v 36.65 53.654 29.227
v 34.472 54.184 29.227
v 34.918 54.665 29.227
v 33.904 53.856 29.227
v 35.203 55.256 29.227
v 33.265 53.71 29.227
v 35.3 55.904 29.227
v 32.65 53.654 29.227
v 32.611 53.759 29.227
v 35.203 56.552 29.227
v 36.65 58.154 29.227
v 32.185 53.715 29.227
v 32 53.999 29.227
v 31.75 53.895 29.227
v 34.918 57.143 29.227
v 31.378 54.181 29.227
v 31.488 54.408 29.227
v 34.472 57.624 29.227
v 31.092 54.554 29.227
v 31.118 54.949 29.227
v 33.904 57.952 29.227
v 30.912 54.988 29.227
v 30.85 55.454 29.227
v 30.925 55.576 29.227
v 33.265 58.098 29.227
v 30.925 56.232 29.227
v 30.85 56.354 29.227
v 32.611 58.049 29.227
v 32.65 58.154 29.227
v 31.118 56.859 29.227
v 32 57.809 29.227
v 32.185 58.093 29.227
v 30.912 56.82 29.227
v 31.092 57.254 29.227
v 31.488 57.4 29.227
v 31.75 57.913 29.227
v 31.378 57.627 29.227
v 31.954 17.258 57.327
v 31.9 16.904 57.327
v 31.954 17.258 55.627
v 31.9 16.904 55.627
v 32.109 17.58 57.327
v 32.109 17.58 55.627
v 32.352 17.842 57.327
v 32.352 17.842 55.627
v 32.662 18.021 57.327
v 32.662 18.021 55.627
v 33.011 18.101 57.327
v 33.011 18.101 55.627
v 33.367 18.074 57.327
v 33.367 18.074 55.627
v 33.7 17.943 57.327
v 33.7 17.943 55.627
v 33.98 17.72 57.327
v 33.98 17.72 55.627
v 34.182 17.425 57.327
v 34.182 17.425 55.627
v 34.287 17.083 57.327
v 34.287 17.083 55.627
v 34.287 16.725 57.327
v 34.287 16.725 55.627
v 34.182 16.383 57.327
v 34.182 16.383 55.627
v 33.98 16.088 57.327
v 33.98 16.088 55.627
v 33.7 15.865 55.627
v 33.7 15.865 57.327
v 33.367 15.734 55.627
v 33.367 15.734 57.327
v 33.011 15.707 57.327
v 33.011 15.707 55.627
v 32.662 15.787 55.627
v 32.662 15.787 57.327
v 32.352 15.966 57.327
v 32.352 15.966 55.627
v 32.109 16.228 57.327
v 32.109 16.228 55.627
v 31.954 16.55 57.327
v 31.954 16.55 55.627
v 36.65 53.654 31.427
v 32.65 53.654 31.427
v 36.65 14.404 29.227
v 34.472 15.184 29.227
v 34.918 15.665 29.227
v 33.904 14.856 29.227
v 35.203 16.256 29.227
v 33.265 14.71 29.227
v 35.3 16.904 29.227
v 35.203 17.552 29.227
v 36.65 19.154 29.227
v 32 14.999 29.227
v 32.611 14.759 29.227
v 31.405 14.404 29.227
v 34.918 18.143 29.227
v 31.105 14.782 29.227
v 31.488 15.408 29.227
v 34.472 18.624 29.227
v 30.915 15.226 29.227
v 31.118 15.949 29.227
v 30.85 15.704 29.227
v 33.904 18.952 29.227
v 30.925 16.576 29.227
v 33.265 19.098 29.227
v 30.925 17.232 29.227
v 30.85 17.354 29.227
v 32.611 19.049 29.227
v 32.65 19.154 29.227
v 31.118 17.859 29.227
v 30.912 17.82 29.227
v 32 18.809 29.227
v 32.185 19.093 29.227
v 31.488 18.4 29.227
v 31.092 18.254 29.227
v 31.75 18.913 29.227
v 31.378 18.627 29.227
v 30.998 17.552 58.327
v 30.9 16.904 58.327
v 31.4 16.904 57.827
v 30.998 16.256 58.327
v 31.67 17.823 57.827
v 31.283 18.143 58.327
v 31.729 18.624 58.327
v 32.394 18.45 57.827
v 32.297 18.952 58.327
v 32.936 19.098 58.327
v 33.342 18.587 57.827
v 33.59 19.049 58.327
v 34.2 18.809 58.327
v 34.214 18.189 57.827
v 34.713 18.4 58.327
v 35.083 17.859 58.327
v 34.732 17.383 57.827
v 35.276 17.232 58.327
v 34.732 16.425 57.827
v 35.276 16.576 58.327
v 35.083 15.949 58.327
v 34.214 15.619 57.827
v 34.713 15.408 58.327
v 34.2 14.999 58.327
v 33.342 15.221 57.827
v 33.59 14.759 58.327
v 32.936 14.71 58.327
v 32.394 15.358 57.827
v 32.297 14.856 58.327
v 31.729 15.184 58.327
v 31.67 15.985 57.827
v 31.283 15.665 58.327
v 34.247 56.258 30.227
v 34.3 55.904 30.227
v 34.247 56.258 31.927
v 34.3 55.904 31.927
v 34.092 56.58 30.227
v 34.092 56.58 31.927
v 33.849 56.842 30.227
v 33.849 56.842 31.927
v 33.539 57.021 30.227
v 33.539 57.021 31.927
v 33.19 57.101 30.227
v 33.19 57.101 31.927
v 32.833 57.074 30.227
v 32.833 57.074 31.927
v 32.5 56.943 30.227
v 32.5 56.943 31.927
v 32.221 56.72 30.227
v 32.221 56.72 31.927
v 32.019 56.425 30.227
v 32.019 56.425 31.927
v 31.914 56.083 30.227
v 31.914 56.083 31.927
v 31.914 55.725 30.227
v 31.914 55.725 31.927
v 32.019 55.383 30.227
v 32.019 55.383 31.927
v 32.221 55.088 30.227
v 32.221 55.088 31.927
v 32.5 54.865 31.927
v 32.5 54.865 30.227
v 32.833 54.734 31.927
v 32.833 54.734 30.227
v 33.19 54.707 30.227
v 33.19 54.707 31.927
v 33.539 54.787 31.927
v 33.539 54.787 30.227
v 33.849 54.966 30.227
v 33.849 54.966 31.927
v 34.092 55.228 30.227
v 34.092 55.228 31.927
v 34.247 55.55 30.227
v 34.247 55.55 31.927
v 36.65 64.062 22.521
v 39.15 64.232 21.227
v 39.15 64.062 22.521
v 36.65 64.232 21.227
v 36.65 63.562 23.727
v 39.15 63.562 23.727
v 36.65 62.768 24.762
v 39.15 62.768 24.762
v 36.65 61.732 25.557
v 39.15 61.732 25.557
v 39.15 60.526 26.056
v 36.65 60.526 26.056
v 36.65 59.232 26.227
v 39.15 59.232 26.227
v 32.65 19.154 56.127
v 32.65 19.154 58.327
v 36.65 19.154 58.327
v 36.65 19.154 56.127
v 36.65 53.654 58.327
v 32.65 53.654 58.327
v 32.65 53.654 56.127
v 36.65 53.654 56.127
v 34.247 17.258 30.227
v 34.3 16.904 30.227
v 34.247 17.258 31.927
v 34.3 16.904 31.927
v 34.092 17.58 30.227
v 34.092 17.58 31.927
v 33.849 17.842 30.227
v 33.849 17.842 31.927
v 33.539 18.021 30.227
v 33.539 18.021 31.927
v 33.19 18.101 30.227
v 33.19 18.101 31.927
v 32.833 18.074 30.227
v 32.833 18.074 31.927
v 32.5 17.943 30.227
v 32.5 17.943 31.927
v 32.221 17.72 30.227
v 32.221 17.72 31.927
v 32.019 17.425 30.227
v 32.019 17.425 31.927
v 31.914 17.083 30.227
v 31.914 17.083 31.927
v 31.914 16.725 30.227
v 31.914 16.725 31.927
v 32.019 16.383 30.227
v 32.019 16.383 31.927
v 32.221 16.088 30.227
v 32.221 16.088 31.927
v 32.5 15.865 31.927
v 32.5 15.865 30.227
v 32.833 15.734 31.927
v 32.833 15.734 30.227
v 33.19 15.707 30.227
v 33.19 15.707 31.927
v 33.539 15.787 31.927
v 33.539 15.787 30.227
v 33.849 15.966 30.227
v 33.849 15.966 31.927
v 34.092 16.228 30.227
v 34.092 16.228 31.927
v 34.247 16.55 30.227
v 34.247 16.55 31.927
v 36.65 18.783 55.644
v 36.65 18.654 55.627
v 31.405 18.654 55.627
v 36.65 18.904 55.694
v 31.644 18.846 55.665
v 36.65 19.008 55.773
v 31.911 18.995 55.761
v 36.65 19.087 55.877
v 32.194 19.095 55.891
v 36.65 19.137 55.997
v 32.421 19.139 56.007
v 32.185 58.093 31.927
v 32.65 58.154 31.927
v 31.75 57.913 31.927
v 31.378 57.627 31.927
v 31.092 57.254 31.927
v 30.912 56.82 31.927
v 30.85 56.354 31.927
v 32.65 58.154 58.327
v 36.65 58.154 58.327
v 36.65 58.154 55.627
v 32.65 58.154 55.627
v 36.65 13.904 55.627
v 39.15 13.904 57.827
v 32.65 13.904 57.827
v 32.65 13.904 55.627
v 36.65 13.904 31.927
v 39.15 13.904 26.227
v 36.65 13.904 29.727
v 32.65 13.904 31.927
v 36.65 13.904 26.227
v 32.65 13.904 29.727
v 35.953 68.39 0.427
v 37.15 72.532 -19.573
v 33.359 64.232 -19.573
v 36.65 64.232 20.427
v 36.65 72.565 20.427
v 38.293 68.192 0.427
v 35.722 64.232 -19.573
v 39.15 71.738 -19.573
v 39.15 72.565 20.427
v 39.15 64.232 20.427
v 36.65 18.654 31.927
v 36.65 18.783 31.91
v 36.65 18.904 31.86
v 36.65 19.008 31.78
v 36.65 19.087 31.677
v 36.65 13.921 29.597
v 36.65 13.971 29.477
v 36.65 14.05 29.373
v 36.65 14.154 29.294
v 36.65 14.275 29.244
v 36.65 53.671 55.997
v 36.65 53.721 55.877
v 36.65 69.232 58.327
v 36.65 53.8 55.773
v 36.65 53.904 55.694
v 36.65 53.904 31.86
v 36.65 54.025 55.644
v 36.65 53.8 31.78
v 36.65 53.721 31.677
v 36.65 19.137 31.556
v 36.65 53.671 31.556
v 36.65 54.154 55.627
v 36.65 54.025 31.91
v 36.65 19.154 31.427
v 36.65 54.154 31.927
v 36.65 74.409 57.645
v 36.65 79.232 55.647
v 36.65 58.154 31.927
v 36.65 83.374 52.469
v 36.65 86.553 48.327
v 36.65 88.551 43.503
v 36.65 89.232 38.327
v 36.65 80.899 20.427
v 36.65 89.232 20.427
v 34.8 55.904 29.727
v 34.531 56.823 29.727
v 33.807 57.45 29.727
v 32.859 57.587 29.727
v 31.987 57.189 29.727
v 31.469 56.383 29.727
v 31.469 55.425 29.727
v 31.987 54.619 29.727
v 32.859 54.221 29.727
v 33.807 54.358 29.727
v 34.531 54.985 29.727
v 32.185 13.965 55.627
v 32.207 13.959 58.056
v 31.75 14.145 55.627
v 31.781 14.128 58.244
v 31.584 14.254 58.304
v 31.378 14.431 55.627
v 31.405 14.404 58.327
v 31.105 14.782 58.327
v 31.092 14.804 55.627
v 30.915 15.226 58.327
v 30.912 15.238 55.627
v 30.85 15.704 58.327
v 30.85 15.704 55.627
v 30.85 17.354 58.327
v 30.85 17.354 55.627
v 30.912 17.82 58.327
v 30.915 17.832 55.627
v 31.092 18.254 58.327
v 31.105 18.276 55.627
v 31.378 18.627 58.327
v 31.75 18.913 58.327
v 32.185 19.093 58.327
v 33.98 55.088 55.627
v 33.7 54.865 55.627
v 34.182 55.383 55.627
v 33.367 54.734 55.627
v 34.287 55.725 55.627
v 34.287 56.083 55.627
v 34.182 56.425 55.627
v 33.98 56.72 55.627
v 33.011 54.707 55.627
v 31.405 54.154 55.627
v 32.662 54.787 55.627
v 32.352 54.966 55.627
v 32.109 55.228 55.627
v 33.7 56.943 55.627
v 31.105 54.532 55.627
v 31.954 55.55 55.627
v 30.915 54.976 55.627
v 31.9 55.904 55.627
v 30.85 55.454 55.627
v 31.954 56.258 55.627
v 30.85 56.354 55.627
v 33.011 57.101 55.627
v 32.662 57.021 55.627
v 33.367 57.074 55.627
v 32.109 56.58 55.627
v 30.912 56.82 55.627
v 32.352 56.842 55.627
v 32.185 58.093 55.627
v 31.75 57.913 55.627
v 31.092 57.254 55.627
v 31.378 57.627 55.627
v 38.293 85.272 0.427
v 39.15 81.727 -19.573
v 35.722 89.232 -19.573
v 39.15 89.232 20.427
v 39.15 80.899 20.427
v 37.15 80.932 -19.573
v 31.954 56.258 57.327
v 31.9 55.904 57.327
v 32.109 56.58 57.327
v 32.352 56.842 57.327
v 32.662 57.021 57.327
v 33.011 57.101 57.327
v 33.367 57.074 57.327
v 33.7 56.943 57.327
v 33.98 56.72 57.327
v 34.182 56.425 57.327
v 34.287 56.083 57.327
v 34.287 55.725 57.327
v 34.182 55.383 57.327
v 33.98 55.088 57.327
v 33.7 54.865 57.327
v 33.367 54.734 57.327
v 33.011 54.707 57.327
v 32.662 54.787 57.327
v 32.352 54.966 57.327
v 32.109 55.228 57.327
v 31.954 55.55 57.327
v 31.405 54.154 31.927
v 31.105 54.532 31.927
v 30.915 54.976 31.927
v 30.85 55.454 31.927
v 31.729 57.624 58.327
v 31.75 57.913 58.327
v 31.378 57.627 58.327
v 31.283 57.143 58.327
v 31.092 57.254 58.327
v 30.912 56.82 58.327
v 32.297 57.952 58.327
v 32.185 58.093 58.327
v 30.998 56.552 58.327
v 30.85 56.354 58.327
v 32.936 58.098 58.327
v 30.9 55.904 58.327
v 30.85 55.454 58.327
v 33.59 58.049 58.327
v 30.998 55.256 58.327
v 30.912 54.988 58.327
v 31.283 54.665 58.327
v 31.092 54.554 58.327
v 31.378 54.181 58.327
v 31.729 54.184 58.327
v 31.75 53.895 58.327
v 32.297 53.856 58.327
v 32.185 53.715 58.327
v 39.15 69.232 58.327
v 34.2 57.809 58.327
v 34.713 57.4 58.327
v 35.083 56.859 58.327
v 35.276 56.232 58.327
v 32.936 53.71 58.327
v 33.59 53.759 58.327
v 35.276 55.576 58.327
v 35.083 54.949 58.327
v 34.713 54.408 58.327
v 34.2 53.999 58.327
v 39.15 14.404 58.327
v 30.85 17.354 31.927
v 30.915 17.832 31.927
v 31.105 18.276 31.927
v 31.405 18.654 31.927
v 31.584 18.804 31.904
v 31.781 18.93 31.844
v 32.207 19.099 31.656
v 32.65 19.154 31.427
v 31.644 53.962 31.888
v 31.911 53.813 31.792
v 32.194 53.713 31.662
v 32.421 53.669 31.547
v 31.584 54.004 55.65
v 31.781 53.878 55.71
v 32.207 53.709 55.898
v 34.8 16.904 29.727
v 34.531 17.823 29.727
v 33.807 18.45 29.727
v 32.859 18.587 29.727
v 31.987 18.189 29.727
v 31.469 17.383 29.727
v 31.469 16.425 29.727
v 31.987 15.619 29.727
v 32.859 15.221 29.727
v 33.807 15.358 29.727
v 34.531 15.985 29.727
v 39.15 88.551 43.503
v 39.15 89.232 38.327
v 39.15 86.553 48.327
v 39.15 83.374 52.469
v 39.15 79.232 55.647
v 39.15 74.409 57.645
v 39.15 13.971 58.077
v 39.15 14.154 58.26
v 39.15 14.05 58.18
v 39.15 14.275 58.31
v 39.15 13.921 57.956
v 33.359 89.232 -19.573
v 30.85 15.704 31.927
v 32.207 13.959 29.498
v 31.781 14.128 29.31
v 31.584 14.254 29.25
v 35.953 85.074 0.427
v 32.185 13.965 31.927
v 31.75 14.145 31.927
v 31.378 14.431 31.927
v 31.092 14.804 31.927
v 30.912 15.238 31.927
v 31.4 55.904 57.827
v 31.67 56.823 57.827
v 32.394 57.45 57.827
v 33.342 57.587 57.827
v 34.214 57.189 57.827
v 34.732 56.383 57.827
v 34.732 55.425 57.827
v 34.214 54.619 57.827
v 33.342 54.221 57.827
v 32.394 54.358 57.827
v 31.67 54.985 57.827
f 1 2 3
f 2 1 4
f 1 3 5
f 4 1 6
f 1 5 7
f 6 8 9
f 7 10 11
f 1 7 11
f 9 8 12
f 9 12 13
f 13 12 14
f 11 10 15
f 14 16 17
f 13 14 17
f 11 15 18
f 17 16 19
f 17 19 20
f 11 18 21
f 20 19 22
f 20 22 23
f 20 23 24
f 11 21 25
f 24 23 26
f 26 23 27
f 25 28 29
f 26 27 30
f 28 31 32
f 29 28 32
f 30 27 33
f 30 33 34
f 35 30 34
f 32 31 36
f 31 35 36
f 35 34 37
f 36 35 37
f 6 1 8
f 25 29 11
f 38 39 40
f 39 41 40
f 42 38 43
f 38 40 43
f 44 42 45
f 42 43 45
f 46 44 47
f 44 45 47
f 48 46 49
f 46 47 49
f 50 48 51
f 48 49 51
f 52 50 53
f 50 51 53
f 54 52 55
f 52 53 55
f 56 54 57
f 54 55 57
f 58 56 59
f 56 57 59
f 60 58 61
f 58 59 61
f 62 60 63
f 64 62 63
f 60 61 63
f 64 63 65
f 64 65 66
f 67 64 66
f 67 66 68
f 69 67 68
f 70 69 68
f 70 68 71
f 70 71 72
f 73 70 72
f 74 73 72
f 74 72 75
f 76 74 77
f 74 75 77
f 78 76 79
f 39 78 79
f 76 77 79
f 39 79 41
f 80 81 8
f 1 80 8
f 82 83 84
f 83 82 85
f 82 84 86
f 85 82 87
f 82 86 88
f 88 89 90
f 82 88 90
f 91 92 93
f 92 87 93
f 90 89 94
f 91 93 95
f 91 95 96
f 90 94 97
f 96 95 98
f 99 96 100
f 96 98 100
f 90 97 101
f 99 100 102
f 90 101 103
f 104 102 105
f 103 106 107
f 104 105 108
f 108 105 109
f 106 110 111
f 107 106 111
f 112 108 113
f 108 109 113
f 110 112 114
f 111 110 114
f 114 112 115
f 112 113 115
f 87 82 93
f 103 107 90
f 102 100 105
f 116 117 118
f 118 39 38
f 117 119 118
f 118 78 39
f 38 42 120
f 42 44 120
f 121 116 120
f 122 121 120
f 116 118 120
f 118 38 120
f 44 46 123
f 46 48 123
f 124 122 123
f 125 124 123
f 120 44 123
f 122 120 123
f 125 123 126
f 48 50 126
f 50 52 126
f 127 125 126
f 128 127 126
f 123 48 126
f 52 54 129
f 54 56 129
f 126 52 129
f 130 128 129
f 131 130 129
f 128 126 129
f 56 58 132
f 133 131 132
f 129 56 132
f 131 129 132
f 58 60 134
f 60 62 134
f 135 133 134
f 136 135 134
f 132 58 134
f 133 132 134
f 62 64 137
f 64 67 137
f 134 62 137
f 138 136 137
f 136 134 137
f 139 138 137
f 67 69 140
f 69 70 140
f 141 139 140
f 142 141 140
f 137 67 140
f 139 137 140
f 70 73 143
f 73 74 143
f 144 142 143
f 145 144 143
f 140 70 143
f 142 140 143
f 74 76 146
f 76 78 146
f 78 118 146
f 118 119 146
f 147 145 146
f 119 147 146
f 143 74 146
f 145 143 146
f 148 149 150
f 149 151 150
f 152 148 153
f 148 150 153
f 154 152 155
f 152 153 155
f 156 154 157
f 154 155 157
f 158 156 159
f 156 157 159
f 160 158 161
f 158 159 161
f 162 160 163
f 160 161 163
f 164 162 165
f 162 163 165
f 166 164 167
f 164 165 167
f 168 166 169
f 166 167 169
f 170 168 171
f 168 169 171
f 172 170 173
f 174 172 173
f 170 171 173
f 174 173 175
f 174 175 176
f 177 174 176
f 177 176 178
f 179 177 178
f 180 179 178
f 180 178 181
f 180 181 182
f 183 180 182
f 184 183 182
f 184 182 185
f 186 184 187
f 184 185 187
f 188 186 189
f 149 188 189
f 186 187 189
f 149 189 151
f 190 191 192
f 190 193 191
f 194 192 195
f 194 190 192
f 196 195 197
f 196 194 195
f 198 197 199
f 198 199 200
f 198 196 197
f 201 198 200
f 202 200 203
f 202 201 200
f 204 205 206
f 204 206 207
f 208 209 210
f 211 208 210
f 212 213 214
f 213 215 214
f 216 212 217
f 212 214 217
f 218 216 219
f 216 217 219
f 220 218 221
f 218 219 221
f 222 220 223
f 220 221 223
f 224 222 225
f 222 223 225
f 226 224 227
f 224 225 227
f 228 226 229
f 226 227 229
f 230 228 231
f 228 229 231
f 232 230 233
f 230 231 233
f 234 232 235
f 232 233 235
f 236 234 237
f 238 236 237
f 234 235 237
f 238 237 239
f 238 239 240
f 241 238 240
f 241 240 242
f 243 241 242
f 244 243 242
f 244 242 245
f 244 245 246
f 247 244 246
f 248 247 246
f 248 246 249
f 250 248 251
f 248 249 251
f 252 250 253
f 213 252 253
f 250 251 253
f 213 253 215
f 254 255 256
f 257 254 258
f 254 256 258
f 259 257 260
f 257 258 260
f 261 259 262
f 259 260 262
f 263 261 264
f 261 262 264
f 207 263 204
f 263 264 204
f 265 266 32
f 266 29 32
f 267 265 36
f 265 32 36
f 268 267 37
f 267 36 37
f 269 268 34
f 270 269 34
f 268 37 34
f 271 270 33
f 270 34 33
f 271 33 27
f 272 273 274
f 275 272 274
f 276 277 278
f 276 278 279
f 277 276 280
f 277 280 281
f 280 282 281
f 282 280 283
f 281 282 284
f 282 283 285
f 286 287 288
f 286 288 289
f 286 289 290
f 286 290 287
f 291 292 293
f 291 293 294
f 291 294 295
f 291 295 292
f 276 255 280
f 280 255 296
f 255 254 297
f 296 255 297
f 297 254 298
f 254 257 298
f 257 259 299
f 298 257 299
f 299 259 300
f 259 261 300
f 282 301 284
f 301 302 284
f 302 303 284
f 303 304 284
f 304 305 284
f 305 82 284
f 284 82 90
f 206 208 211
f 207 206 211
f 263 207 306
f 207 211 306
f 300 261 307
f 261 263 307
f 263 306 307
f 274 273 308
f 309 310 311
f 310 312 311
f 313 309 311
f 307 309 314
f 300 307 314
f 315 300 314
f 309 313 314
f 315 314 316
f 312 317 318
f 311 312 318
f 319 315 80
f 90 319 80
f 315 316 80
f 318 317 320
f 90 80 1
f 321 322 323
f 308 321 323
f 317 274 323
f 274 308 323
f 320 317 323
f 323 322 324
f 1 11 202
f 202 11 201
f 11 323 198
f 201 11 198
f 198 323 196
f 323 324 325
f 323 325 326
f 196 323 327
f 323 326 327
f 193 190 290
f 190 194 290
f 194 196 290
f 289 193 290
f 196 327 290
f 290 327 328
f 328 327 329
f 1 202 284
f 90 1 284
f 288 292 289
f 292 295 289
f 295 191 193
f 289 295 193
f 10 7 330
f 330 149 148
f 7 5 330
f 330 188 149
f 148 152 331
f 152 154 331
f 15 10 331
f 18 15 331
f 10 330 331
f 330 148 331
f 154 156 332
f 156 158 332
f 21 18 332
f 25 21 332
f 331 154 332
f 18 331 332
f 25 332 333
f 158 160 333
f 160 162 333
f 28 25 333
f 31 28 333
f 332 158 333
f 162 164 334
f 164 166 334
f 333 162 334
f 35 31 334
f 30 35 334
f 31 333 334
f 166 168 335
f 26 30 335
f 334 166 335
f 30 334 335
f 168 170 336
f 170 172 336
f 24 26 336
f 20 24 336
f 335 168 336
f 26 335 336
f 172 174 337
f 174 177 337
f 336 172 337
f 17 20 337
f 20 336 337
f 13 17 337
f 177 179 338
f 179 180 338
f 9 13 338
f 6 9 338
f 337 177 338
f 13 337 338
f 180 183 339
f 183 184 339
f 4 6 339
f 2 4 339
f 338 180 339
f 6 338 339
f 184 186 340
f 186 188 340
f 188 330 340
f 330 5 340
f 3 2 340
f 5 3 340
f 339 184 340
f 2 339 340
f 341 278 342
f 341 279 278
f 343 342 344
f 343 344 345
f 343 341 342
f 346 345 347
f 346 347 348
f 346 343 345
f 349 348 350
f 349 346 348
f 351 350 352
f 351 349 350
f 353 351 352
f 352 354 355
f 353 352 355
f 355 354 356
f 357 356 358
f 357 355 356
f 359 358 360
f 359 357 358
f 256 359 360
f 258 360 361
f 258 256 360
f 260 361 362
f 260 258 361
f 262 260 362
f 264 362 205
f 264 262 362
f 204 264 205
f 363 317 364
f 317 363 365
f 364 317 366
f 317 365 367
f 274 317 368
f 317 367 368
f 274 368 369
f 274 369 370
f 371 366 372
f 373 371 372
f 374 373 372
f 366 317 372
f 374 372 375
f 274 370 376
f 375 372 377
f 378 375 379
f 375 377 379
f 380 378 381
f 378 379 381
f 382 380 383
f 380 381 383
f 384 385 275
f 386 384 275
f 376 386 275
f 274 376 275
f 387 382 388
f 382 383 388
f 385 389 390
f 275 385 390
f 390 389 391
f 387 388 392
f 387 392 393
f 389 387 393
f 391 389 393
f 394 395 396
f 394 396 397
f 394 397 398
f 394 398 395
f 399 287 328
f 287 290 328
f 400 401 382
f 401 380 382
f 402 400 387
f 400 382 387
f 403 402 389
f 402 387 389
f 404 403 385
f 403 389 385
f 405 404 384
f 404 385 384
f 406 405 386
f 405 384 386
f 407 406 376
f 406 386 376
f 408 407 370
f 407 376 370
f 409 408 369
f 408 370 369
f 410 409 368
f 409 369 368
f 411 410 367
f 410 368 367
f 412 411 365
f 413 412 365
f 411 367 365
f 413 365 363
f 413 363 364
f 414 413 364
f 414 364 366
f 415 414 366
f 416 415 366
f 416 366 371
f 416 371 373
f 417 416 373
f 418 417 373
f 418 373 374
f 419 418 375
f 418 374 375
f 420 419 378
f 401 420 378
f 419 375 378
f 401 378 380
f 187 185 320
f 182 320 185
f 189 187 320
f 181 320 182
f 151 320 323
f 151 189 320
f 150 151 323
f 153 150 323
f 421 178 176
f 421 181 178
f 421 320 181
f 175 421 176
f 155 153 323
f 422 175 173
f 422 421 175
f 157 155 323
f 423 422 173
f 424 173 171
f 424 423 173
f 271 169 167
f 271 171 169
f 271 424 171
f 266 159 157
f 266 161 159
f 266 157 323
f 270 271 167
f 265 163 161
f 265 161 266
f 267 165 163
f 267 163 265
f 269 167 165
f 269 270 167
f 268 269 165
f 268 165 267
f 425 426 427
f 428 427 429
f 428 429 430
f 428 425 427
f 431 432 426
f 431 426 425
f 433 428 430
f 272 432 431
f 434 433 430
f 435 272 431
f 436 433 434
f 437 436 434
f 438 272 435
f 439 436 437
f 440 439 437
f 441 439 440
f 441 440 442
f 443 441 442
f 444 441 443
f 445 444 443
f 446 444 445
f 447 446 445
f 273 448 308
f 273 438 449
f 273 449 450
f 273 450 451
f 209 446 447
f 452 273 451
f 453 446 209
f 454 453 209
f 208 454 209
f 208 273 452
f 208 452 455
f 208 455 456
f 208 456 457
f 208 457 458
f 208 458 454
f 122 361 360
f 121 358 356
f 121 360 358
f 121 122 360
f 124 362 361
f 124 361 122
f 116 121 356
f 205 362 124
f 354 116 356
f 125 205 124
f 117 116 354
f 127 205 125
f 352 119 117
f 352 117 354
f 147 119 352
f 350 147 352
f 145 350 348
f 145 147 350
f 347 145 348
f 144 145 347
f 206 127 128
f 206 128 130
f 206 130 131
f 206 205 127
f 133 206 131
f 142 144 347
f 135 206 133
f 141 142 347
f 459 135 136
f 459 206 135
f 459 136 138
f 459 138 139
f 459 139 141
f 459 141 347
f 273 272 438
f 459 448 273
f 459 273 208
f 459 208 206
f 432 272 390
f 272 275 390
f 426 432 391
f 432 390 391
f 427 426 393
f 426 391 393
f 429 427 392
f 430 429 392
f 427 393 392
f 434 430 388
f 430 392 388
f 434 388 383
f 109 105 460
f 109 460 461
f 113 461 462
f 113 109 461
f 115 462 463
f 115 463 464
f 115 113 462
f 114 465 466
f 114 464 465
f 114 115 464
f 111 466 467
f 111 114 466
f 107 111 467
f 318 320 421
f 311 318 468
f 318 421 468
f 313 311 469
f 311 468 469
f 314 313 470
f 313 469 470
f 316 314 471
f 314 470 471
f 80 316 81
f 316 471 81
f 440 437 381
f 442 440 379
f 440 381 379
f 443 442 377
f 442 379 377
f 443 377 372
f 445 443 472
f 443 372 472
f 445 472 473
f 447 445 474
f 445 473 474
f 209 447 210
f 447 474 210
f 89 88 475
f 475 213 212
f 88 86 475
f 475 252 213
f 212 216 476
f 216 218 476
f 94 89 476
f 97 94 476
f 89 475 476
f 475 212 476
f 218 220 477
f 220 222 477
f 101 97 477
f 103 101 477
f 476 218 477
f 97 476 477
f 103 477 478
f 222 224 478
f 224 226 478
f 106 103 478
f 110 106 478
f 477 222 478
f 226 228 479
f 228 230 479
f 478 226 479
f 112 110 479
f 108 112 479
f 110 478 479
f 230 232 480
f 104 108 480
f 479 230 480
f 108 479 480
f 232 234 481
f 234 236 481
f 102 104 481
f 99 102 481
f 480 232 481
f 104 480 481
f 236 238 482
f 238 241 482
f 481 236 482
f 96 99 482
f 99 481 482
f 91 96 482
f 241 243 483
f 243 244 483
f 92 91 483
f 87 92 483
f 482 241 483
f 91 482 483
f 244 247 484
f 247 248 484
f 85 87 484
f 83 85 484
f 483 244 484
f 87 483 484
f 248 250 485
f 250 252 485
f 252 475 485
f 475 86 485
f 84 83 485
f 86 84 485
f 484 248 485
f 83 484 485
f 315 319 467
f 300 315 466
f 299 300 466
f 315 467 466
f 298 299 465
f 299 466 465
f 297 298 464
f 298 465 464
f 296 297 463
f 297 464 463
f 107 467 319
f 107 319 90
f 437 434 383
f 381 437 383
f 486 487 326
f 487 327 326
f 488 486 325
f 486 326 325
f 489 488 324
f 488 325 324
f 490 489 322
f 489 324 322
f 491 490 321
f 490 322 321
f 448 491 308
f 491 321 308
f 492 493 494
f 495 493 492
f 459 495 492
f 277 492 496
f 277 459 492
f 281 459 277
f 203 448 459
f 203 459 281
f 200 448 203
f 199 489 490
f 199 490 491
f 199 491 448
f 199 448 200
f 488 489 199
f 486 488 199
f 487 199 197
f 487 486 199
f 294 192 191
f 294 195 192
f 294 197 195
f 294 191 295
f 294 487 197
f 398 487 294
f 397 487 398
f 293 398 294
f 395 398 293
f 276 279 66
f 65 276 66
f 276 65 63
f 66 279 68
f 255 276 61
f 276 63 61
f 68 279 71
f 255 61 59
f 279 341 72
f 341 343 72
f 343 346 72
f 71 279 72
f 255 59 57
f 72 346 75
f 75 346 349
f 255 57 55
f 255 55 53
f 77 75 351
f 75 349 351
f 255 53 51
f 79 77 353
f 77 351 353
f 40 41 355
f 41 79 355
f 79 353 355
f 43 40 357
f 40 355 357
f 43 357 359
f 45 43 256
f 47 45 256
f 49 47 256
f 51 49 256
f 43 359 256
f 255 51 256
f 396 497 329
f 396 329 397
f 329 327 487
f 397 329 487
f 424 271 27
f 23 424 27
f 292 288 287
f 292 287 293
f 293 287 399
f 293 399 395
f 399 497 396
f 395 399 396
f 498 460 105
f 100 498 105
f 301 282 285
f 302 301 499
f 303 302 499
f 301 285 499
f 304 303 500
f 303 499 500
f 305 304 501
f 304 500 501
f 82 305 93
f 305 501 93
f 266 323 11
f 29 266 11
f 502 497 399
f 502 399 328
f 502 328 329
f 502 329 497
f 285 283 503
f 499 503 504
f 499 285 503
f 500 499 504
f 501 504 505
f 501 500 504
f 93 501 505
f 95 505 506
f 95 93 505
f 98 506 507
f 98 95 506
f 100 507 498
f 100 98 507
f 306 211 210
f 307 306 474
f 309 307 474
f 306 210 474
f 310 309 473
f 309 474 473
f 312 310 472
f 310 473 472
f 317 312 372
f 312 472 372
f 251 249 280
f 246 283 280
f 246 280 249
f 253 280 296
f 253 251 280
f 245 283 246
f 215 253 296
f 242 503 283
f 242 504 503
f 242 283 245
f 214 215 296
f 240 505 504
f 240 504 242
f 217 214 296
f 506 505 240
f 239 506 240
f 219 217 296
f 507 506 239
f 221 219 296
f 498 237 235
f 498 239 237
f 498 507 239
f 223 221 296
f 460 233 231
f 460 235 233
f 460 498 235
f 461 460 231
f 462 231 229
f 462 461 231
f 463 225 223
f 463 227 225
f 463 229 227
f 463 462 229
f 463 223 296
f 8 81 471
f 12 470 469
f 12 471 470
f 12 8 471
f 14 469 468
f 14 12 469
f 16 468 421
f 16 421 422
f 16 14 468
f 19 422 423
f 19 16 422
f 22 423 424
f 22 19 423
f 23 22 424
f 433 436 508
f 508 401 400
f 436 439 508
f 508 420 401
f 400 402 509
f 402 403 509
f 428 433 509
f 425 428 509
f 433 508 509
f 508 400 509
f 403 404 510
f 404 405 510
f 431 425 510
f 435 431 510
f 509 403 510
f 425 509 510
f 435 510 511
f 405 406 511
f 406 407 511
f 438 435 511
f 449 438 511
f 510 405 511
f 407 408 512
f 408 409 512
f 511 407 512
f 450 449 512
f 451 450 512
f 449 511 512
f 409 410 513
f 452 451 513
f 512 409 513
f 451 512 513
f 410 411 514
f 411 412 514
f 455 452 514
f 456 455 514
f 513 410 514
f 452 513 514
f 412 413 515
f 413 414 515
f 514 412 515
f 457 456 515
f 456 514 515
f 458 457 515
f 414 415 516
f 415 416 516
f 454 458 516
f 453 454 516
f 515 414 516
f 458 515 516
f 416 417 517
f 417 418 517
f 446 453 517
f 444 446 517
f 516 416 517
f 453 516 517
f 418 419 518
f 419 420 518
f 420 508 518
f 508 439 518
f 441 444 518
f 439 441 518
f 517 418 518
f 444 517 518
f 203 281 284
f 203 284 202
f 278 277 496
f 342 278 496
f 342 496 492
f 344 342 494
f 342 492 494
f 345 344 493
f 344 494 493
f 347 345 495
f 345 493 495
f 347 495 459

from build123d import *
from OCP.BRepFilletAPI import BRepFilletAPI_MakeFillet

# Parameters (mm, degrees)
BOSS_EXTRUDE1_START                                 = 0.25
SKETCH1_W                                           = 2.7
SKETCH1_H                                           = 4.5
BOSS_EXTRUDE1_DEPTH                                 = 5.8
SKETCH1_H_2                                         = 5.25
BOSS_EXTRUDE1_2_DEPTH                               = 5.8
BOSS_EXTRUDE1_3_DEPTH                               = 5.8
BOSS_EXTRUDE1_4_DEPTH                               = 5.8
SKETCH2_W                                           = 32.1
SKETCH2_H                                           = 44.25
BOSS_EXTRUDE2_DEPTH                                 = 2.5
BOSS_EXTRUDE3_DEPTH                                 = 2.5
CSK_FOR_M2_COUNTERSUNK_FLAT_HEAD_SCREW1_D           = 2.4
CSK_FOR_M2_COUNTERSUNK_FLAT_HEAD_SCREW1_DEPTH       = 4
CSK_FOR_M2_COUNTERSUNK_FLAT_HEAD_SCREW1_CSINK_D     = 4.4
CSK_FOR_M2_COUNTERSUNK_FLAT_HEAD_SCREW1_CSINK_ANGLE = 90
CSK_FOR_M2_COUNTERSUNK_FLAT_HEAD_SCREW1_TIP         = 0.721032743
CSK_FOR_M2_COUNTERSUNK_FLAT_HEAD_SCREW2_D           = 2.4
CSK_FOR_M2_COUNTERSUNK_FLAT_HEAD_SCREW2_DEPTH       = 4
CSK_FOR_M2_COUNTERSUNK_FLAT_HEAD_SCREW2_CSINK_D     = 4.4
CSK_FOR_M2_COUNTERSUNK_FLAT_HEAD_SCREW2_CSINK_ANGLE = 90
CSK_FOR_M2_COUNTERSUNK_FLAT_HEAD_SCREW2_TIP         = 0.721032743
FILLET1_R1                                          = 20
FILLET1_R2                                          = 5
FILLET2_R                                           = 1.8
FILLET3_R                                           = 0.5


with BuildPart() as part:
    # Sketch1 → Boss-Extrude1 (new body)
    with BuildSketch(Plane(origin=(30.600472417, 0, 0), x_dir=(0, 0, -1), z_dir=(1, 0, 0)).offset(BOSS_EXTRUDE1_START)):
        with Locations((-30.576835801, 55.903969126)):
            Rectangle(SKETCH1_W, SKETCH1_H)
    extrude(amount=BOSS_EXTRUDE1_DEPTH)



with BuildPart() as body_2:
    # Sketch1 → Boss-Extrude1 2 (new body)
    with BuildSketch(Plane(origin=(30.600472417, 0, 0), x_dir=(0, 0, -1), z_dir=(1, 0, 0)).offset(BOSS_EXTRUDE1_START)):
        with Locations((-30.576835801, 16.528969126)):
            Rectangle(SKETCH1_W, SKETCH1_H_2)
    extrude(amount=BOSS_EXTRUDE1_2_DEPTH)


with BuildPart() as body_3:
    # Sketch1 → Boss-Extrude1 3 (new body)
    with BuildSketch(Plane(origin=(30.600472417, 0, 0), x_dir=(0, 0, -1), z_dir=(1, 0, 0)).offset(BOSS_EXTRUDE1_START)):
        with Locations((-56.976835801, 16.528969126)):
            Rectangle(SKETCH1_W, SKETCH1_H_2)
    extrude(amount=BOSS_EXTRUDE1_3_DEPTH)


with BuildPart() as body_4:
    # Sketch1 → Boss-Extrude1 4 (new body)
    with BuildSketch(Plane(origin=(30.600472417, 0, 0), x_dir=(0, 0, -1), z_dir=(1, 0, 0)).offset(BOSS_EXTRUDE1_START)):
        with Locations((-56.976835801, 55.903969126)):
            Rectangle(SKETCH1_W, SKETCH1_H)
    extrude(amount=BOSS_EXTRUDE1_4_DEPTH)


with BuildPart() as part_1:
    add(part.part)

    add(body_2.part)  # Boss-Extrude2 merges body 2

    add(body_3.part)  # Boss-Extrude2 merges body 3

    add(body_4.part)  # Boss-Extrude2 merges body 4
    # Sketch2 → Boss-Extrude2 (add)
    with BuildSketch(Plane(origin=(36.650472417, 0, 0), x_dir=(0, 0, -1), z_dir=(1, 0, 0))):
        with Locations((-42.276835801, 36.028969126)):
            Rectangle(SKETCH2_W, SKETCH2_H)
    extrude(amount=BOSS_EXTRUDE2_DEPTH)

    # Sketch3 → Boss-Extrude3 (add)
    with BuildSketch(Plane(origin=(39.150472417, 0, 0), x_dir=(0, 0, -1), z_dir=(1, 0, 0))):
        Polygon((-20.426835801, 89.232146542), (-58.326835801, 89.232146542), (-58.326835801, 58.153969126), (-26.226835801, 58.153969126), (-26.226835801, 64.232146542), (-20.426835801, 64.232146542), align=None)
    extrude(amount=-BOSS_EXTRUDE3_DEPTH)

    # CSK for M2 Countersunk Flat Head Screw1
    with Locations(Plane.XY.offset(58.326835801)):
        with Locations((33.100472417, 55.903969126), (33.100472417, 16.903969126)):
            CounterSinkHole(CSK_FOR_M2_COUNTERSUNK_FLAT_HEAD_SCREW1_D / 2, CSK_FOR_M2_COUNTERSUNK_FLAT_HEAD_SCREW1_CSINK_D / 2, depth=CSK_FOR_M2_COUNTERSUNK_FLAT_HEAD_SCREW1_DEPTH, counter_sink_angle=CSK_FOR_M2_COUNTERSUNK_FLAT_HEAD_SCREW1_CSINK_ANGLE)
            with Locations((0, 0, -(CSK_FOR_M2_COUNTERSUNK_FLAT_HEAD_SCREW1_DEPTH + CSK_FOR_M2_COUNTERSUNK_FLAT_HEAD_SCREW1_TIP / 2))):  # 118° drill point
                Cone(0, CSK_FOR_M2_COUNTERSUNK_FLAT_HEAD_SCREW1_D / 2, CSK_FOR_M2_COUNTERSUNK_FLAT_HEAD_SCREW1_TIP, mode=Mode.SUBTRACT)

    # CSK for M2 Countersunk Flat Head Screw2
    with Locations(Plane(origin=(0, 0, 29.226835801), x_dir=(-1, 0, 0), z_dir=(0, 0, -1))):
        with Locations((-33.100472417, 55.903969126), (-33.100472417, 16.903969126)):
            CounterSinkHole(CSK_FOR_M2_COUNTERSUNK_FLAT_HEAD_SCREW2_D / 2, CSK_FOR_M2_COUNTERSUNK_FLAT_HEAD_SCREW2_CSINK_D / 2, depth=CSK_FOR_M2_COUNTERSUNK_FLAT_HEAD_SCREW2_DEPTH, counter_sink_angle=CSK_FOR_M2_COUNTERSUNK_FLAT_HEAD_SCREW2_CSINK_ANGLE)
            with Locations((0, 0, -(CSK_FOR_M2_COUNTERSUNK_FLAT_HEAD_SCREW2_DEPTH + CSK_FOR_M2_COUNTERSUNK_FLAT_HEAD_SCREW2_TIP / 2))):  # 118° drill point
                Cone(0, CSK_FOR_M2_COUNTERSUNK_FLAT_HEAD_SCREW2_D / 2, CSK_FOR_M2_COUNTERSUNK_FLAT_HEAD_SCREW2_TIP, mode=Mode.SUBTRACT)

    # Fillet1: one fillet with a radius per group of edges: ONE call of the kernel's fillet builder (fillet() takes one radius for all edges)
    fillet1_edges_1 = [part_1.edges().sort_by_distance(p)[0] for p in [
        (37.900472417, 89.232146542, 58.326835801),
    ]]
    fillet1_edges_2 = [part_1.edges().sort_by_distance(p)[0] for p in [
        (37.900472417, 64.232146542, 26.226835801),
    ]]
    fillet1 = BRepFilletAPI_MakeFillet(part_1.part.solid().wrapped)
    for e in fillet1_edges_1:
        fillet1.Add(FILLET1_R1, e.wrapped)
    for e in fillet1_edges_2:
        fillet1.Add(FILLET1_R2, e.wrapped)
    add(Compound.cast(fillet1.Shape()), mode=Mode.REPLACE)

    # Loft1: read off the stored shape, not the designer's step
    # Loft1: loft between two sections, ruled curve by curve
    loft1_from = [
        Edge.make_bspline([(39.150472417, 81.726792839, -19.573164199), (38.579023668, 82.977685123, -19.573164199), (38.007574919, 84.228577407, -19.573164199), (36.864677421, 86.730361975, -19.573164199), (36.293228672, 87.981254258, -19.573164199), (35.721779923, 89.232146542, -19.573164199)], [0, 0, 0, 0, 0.5, 0.5, 1, 1, 1, 1], 3),
        Edge.make_bspline([(33.358759351, 89.232146542, -19.573164199), (33.990711529, 87.848813209, -19.573164199), (34.622663707, 86.465479876, -19.573164199), (35.886568062, 83.698813209, -19.573164199), (36.51852024, 82.315479876, -19.573164199), (37.150472417, 80.932146542, -19.573164199)], [0, 0, 0, 0, 0.5, 0.5, 1, 1, 1, 1], 3),
        Edge.make_bspline([(37.150472417, 72.532146542, -19.573164199), (36.51852024, 71.148813209, -19.573164199), (35.886568062, 69.765479876, -19.573164199), (34.622663707, 66.998813209, -19.573164199), (33.990711529, 65.615479876, -19.573164199), (33.358759351, 64.232146542, -19.573164199)], [0, 0, 0, 0, 0.5, 0.5, 1, 1, 1, 1], 3),
        Edge.make_bspline([(35.721779923, 64.232146542, -19.573164199), (36.293228672, 65.483038826, -19.573164199), (36.864677421, 66.73393111, -19.573164199), (38.007574919, 69.235715678, -19.573164199), (38.579023668, 70.486607962, -19.573164199), (39.150472417, 71.737500246, -19.573164199)], [0, 0, 0, 0, 0.5, 0.5, 1, 1, 1, 1], 3),
        Edge.make_line((37.150472417, 72.532146542, -19.573164199), (37.150472417, 80.932146542, -19.573164199)),
        Edge.make_line((33.358759351, 89.232146542, -19.573164199), (35.721779923, 89.232146542, -19.573164199)),
        Edge.make_line((35.721779923, 64.232146542, -19.573164199), (33.358759351, 64.232146542, -19.573164199)),
        Edge.make_line((39.150472417, 71.737500246, -19.573164199), (39.150472417, 81.726792839, -19.573164199)),
    ]
    loft1_to = [
        Edge.make_bspline([(39.150472417, 80.898813209, 20.426835801), (39.150472417, 82.287702098, 20.426835801), (39.150472417, 83.676590987, 20.426835801), (39.150472417, 86.454368765, 20.426835801), (39.150472417, 87.843257653, 20.426835801), (39.150472417, 89.232146542, 20.426835801)], [0, 0, 0, 0, 0.5, 0.5, 1, 1, 1, 1], 3),
        Edge.make_bspline([(36.650472417, 89.232146542, 20.426835801), (36.650472417, 87.843257653, 20.426835801), (36.650472417, 86.454368765, 20.426835801), (36.650472417, 83.676590987, 20.426835801), (36.650472417, 82.287702098, 20.426835801), (36.650472417, 80.898813209, 20.426835801)], [0, 0, 0, 0, 0.5, 0.5, 1, 1, 1, 1], 3),
        Edge.make_bspline([(36.650472417, 72.565479876, 20.426835801), (36.650472417, 71.176590987, 20.426835801), (36.650472417, 69.787702098, 20.426835801), (36.650472417, 67.00992432, 20.426835801), (36.650472417, 65.621035431, 20.426835801), (36.650472417, 64.232146542, 20.426835801)], [0, 0, 0, 0, 0.5, 0.5, 1, 1, 1, 1], 3),
        Edge.make_bspline([(39.150472417, 64.232146542, 20.426835801), (39.150472417, 65.621035431, 20.426835801), (39.150472417, 67.00992432, 20.426835801), (39.150472417, 69.787702098, 20.426835801), (39.150472417, 71.176590987, 20.426835801), (39.150472417, 72.565479876, 20.426835801)], [0, 0, 0, 0, 0.5, 0.5, 1, 1, 1, 1], 3),
        Edge.make_line((36.650472417, 72.565479876, 20.426835801), (36.650472417, 80.898813209, 20.426835801)),
        Edge.make_line((36.650472417, 89.232146542, 20.426835801), (39.150472417, 89.232146542, 20.426835801)),
        Edge.make_line((39.150472417, 64.232146542, 20.426835801), (36.650472417, 64.232146542, 20.426835801)),
        Edge.make_line((39.150472417, 72.565479876, 20.426835801), (39.150472417, 80.898813209, 20.426835801)),
    ]
    loft1 = Solid(Shell([*[Face.make_surface_from_curves(loft1_from[k], loft1_to[k]) for k in range(8)], Face(Wire(loft1_from)), Face(Wire(loft1_to))]))
    add(loft1)

    # Fillet2
    fillet2_edges = [part_1.edges().sort_by_distance(p)[0] for p in [
        (30.850472417, 58.153969126, 30.576835801),
        (30.850472417, 13.903969126, 30.576835801),
        (30.850472417, 53.653969126, 30.576835801),
        (30.850472417, 19.153969126, 30.576835801),
        (30.850472417, 19.153969126, 56.976835801),
        (30.850472417, 13.903969126, 56.976835801),
        (30.850472417, 58.153969126, 56.976835801),
        (30.850472417, 53.653969126, 56.976835801),
    ]]
    fillet(fillet2_edges, radius=FILLET2_R)

    # Fillet3
    # the kernel refuses this fillet: 0.5 mm, written as the material it takes off along each edge
    with BuildSketch(Plane(origin=(40.400472417, 13.903969126, 58.326835801), x_dir=(0, 1, 0), z_dir=(-1, 0, 0))) as fillet3_piece_1:
        with BuildLine():
            CenterArc((FILLET3_R, FILLET3_R), FILLET3_R, 180, 90)
            Line((0, FILLET3_R), (0, 0))
            Line((0, 0), (FILLET3_R, 0))
        make_face()
    extrude(amount=9, mode=Mode.SUBTRACT)
    with BuildSketch(Plane(origin=(31.400472417, 19.153969126, 31.926835801), x_dir=(0, -1, 0), z_dir=(1, 0, 0)), Plane(origin=(31.400472417, 19.153969126, 55.626835801), x_dir=(0, 0, 1), z_dir=(1, 0, 0)), Plane(origin=(31.400472417, 53.653969126, 31.926835801), x_dir=(0, 0, -1), z_dir=(1, 0, 0))) as fillet3_piece_2:
        with BuildLine():
            CenterArc((FILLET3_R, FILLET3_R), FILLET3_R, 180, 90)
            Line((0, FILLET3_R), (0, 0))
            Line((0, 0), (FILLET3_R, 0))
        make_face()
    extrude(amount=5.25, mode=Mode.SUBTRACT)
    with BuildSketch(Plane(origin=(31.400472417, 13.903969126, 29.226835801), x_dir=(0, 0, 1), z_dir=(1, 0, 0)), Plane(origin=(31.400472417, 53.653969126, 55.626835801), x_dir=(0, 0, 1), z_dir=(1, 0, 0))) as fillet3_piece_3:
        with BuildLine():
            CenterArc((FILLET3_R, -FILLET3_R), FILLET3_R, 90, 90)
            Line((0, -FILLET3_R), (0, 0))
            Line((0, 0), (FILLET3_R, 0))
        make_face()
    extrude(amount=5.25, mode=Mode.SUBTRACT)


solid = part_1.part
